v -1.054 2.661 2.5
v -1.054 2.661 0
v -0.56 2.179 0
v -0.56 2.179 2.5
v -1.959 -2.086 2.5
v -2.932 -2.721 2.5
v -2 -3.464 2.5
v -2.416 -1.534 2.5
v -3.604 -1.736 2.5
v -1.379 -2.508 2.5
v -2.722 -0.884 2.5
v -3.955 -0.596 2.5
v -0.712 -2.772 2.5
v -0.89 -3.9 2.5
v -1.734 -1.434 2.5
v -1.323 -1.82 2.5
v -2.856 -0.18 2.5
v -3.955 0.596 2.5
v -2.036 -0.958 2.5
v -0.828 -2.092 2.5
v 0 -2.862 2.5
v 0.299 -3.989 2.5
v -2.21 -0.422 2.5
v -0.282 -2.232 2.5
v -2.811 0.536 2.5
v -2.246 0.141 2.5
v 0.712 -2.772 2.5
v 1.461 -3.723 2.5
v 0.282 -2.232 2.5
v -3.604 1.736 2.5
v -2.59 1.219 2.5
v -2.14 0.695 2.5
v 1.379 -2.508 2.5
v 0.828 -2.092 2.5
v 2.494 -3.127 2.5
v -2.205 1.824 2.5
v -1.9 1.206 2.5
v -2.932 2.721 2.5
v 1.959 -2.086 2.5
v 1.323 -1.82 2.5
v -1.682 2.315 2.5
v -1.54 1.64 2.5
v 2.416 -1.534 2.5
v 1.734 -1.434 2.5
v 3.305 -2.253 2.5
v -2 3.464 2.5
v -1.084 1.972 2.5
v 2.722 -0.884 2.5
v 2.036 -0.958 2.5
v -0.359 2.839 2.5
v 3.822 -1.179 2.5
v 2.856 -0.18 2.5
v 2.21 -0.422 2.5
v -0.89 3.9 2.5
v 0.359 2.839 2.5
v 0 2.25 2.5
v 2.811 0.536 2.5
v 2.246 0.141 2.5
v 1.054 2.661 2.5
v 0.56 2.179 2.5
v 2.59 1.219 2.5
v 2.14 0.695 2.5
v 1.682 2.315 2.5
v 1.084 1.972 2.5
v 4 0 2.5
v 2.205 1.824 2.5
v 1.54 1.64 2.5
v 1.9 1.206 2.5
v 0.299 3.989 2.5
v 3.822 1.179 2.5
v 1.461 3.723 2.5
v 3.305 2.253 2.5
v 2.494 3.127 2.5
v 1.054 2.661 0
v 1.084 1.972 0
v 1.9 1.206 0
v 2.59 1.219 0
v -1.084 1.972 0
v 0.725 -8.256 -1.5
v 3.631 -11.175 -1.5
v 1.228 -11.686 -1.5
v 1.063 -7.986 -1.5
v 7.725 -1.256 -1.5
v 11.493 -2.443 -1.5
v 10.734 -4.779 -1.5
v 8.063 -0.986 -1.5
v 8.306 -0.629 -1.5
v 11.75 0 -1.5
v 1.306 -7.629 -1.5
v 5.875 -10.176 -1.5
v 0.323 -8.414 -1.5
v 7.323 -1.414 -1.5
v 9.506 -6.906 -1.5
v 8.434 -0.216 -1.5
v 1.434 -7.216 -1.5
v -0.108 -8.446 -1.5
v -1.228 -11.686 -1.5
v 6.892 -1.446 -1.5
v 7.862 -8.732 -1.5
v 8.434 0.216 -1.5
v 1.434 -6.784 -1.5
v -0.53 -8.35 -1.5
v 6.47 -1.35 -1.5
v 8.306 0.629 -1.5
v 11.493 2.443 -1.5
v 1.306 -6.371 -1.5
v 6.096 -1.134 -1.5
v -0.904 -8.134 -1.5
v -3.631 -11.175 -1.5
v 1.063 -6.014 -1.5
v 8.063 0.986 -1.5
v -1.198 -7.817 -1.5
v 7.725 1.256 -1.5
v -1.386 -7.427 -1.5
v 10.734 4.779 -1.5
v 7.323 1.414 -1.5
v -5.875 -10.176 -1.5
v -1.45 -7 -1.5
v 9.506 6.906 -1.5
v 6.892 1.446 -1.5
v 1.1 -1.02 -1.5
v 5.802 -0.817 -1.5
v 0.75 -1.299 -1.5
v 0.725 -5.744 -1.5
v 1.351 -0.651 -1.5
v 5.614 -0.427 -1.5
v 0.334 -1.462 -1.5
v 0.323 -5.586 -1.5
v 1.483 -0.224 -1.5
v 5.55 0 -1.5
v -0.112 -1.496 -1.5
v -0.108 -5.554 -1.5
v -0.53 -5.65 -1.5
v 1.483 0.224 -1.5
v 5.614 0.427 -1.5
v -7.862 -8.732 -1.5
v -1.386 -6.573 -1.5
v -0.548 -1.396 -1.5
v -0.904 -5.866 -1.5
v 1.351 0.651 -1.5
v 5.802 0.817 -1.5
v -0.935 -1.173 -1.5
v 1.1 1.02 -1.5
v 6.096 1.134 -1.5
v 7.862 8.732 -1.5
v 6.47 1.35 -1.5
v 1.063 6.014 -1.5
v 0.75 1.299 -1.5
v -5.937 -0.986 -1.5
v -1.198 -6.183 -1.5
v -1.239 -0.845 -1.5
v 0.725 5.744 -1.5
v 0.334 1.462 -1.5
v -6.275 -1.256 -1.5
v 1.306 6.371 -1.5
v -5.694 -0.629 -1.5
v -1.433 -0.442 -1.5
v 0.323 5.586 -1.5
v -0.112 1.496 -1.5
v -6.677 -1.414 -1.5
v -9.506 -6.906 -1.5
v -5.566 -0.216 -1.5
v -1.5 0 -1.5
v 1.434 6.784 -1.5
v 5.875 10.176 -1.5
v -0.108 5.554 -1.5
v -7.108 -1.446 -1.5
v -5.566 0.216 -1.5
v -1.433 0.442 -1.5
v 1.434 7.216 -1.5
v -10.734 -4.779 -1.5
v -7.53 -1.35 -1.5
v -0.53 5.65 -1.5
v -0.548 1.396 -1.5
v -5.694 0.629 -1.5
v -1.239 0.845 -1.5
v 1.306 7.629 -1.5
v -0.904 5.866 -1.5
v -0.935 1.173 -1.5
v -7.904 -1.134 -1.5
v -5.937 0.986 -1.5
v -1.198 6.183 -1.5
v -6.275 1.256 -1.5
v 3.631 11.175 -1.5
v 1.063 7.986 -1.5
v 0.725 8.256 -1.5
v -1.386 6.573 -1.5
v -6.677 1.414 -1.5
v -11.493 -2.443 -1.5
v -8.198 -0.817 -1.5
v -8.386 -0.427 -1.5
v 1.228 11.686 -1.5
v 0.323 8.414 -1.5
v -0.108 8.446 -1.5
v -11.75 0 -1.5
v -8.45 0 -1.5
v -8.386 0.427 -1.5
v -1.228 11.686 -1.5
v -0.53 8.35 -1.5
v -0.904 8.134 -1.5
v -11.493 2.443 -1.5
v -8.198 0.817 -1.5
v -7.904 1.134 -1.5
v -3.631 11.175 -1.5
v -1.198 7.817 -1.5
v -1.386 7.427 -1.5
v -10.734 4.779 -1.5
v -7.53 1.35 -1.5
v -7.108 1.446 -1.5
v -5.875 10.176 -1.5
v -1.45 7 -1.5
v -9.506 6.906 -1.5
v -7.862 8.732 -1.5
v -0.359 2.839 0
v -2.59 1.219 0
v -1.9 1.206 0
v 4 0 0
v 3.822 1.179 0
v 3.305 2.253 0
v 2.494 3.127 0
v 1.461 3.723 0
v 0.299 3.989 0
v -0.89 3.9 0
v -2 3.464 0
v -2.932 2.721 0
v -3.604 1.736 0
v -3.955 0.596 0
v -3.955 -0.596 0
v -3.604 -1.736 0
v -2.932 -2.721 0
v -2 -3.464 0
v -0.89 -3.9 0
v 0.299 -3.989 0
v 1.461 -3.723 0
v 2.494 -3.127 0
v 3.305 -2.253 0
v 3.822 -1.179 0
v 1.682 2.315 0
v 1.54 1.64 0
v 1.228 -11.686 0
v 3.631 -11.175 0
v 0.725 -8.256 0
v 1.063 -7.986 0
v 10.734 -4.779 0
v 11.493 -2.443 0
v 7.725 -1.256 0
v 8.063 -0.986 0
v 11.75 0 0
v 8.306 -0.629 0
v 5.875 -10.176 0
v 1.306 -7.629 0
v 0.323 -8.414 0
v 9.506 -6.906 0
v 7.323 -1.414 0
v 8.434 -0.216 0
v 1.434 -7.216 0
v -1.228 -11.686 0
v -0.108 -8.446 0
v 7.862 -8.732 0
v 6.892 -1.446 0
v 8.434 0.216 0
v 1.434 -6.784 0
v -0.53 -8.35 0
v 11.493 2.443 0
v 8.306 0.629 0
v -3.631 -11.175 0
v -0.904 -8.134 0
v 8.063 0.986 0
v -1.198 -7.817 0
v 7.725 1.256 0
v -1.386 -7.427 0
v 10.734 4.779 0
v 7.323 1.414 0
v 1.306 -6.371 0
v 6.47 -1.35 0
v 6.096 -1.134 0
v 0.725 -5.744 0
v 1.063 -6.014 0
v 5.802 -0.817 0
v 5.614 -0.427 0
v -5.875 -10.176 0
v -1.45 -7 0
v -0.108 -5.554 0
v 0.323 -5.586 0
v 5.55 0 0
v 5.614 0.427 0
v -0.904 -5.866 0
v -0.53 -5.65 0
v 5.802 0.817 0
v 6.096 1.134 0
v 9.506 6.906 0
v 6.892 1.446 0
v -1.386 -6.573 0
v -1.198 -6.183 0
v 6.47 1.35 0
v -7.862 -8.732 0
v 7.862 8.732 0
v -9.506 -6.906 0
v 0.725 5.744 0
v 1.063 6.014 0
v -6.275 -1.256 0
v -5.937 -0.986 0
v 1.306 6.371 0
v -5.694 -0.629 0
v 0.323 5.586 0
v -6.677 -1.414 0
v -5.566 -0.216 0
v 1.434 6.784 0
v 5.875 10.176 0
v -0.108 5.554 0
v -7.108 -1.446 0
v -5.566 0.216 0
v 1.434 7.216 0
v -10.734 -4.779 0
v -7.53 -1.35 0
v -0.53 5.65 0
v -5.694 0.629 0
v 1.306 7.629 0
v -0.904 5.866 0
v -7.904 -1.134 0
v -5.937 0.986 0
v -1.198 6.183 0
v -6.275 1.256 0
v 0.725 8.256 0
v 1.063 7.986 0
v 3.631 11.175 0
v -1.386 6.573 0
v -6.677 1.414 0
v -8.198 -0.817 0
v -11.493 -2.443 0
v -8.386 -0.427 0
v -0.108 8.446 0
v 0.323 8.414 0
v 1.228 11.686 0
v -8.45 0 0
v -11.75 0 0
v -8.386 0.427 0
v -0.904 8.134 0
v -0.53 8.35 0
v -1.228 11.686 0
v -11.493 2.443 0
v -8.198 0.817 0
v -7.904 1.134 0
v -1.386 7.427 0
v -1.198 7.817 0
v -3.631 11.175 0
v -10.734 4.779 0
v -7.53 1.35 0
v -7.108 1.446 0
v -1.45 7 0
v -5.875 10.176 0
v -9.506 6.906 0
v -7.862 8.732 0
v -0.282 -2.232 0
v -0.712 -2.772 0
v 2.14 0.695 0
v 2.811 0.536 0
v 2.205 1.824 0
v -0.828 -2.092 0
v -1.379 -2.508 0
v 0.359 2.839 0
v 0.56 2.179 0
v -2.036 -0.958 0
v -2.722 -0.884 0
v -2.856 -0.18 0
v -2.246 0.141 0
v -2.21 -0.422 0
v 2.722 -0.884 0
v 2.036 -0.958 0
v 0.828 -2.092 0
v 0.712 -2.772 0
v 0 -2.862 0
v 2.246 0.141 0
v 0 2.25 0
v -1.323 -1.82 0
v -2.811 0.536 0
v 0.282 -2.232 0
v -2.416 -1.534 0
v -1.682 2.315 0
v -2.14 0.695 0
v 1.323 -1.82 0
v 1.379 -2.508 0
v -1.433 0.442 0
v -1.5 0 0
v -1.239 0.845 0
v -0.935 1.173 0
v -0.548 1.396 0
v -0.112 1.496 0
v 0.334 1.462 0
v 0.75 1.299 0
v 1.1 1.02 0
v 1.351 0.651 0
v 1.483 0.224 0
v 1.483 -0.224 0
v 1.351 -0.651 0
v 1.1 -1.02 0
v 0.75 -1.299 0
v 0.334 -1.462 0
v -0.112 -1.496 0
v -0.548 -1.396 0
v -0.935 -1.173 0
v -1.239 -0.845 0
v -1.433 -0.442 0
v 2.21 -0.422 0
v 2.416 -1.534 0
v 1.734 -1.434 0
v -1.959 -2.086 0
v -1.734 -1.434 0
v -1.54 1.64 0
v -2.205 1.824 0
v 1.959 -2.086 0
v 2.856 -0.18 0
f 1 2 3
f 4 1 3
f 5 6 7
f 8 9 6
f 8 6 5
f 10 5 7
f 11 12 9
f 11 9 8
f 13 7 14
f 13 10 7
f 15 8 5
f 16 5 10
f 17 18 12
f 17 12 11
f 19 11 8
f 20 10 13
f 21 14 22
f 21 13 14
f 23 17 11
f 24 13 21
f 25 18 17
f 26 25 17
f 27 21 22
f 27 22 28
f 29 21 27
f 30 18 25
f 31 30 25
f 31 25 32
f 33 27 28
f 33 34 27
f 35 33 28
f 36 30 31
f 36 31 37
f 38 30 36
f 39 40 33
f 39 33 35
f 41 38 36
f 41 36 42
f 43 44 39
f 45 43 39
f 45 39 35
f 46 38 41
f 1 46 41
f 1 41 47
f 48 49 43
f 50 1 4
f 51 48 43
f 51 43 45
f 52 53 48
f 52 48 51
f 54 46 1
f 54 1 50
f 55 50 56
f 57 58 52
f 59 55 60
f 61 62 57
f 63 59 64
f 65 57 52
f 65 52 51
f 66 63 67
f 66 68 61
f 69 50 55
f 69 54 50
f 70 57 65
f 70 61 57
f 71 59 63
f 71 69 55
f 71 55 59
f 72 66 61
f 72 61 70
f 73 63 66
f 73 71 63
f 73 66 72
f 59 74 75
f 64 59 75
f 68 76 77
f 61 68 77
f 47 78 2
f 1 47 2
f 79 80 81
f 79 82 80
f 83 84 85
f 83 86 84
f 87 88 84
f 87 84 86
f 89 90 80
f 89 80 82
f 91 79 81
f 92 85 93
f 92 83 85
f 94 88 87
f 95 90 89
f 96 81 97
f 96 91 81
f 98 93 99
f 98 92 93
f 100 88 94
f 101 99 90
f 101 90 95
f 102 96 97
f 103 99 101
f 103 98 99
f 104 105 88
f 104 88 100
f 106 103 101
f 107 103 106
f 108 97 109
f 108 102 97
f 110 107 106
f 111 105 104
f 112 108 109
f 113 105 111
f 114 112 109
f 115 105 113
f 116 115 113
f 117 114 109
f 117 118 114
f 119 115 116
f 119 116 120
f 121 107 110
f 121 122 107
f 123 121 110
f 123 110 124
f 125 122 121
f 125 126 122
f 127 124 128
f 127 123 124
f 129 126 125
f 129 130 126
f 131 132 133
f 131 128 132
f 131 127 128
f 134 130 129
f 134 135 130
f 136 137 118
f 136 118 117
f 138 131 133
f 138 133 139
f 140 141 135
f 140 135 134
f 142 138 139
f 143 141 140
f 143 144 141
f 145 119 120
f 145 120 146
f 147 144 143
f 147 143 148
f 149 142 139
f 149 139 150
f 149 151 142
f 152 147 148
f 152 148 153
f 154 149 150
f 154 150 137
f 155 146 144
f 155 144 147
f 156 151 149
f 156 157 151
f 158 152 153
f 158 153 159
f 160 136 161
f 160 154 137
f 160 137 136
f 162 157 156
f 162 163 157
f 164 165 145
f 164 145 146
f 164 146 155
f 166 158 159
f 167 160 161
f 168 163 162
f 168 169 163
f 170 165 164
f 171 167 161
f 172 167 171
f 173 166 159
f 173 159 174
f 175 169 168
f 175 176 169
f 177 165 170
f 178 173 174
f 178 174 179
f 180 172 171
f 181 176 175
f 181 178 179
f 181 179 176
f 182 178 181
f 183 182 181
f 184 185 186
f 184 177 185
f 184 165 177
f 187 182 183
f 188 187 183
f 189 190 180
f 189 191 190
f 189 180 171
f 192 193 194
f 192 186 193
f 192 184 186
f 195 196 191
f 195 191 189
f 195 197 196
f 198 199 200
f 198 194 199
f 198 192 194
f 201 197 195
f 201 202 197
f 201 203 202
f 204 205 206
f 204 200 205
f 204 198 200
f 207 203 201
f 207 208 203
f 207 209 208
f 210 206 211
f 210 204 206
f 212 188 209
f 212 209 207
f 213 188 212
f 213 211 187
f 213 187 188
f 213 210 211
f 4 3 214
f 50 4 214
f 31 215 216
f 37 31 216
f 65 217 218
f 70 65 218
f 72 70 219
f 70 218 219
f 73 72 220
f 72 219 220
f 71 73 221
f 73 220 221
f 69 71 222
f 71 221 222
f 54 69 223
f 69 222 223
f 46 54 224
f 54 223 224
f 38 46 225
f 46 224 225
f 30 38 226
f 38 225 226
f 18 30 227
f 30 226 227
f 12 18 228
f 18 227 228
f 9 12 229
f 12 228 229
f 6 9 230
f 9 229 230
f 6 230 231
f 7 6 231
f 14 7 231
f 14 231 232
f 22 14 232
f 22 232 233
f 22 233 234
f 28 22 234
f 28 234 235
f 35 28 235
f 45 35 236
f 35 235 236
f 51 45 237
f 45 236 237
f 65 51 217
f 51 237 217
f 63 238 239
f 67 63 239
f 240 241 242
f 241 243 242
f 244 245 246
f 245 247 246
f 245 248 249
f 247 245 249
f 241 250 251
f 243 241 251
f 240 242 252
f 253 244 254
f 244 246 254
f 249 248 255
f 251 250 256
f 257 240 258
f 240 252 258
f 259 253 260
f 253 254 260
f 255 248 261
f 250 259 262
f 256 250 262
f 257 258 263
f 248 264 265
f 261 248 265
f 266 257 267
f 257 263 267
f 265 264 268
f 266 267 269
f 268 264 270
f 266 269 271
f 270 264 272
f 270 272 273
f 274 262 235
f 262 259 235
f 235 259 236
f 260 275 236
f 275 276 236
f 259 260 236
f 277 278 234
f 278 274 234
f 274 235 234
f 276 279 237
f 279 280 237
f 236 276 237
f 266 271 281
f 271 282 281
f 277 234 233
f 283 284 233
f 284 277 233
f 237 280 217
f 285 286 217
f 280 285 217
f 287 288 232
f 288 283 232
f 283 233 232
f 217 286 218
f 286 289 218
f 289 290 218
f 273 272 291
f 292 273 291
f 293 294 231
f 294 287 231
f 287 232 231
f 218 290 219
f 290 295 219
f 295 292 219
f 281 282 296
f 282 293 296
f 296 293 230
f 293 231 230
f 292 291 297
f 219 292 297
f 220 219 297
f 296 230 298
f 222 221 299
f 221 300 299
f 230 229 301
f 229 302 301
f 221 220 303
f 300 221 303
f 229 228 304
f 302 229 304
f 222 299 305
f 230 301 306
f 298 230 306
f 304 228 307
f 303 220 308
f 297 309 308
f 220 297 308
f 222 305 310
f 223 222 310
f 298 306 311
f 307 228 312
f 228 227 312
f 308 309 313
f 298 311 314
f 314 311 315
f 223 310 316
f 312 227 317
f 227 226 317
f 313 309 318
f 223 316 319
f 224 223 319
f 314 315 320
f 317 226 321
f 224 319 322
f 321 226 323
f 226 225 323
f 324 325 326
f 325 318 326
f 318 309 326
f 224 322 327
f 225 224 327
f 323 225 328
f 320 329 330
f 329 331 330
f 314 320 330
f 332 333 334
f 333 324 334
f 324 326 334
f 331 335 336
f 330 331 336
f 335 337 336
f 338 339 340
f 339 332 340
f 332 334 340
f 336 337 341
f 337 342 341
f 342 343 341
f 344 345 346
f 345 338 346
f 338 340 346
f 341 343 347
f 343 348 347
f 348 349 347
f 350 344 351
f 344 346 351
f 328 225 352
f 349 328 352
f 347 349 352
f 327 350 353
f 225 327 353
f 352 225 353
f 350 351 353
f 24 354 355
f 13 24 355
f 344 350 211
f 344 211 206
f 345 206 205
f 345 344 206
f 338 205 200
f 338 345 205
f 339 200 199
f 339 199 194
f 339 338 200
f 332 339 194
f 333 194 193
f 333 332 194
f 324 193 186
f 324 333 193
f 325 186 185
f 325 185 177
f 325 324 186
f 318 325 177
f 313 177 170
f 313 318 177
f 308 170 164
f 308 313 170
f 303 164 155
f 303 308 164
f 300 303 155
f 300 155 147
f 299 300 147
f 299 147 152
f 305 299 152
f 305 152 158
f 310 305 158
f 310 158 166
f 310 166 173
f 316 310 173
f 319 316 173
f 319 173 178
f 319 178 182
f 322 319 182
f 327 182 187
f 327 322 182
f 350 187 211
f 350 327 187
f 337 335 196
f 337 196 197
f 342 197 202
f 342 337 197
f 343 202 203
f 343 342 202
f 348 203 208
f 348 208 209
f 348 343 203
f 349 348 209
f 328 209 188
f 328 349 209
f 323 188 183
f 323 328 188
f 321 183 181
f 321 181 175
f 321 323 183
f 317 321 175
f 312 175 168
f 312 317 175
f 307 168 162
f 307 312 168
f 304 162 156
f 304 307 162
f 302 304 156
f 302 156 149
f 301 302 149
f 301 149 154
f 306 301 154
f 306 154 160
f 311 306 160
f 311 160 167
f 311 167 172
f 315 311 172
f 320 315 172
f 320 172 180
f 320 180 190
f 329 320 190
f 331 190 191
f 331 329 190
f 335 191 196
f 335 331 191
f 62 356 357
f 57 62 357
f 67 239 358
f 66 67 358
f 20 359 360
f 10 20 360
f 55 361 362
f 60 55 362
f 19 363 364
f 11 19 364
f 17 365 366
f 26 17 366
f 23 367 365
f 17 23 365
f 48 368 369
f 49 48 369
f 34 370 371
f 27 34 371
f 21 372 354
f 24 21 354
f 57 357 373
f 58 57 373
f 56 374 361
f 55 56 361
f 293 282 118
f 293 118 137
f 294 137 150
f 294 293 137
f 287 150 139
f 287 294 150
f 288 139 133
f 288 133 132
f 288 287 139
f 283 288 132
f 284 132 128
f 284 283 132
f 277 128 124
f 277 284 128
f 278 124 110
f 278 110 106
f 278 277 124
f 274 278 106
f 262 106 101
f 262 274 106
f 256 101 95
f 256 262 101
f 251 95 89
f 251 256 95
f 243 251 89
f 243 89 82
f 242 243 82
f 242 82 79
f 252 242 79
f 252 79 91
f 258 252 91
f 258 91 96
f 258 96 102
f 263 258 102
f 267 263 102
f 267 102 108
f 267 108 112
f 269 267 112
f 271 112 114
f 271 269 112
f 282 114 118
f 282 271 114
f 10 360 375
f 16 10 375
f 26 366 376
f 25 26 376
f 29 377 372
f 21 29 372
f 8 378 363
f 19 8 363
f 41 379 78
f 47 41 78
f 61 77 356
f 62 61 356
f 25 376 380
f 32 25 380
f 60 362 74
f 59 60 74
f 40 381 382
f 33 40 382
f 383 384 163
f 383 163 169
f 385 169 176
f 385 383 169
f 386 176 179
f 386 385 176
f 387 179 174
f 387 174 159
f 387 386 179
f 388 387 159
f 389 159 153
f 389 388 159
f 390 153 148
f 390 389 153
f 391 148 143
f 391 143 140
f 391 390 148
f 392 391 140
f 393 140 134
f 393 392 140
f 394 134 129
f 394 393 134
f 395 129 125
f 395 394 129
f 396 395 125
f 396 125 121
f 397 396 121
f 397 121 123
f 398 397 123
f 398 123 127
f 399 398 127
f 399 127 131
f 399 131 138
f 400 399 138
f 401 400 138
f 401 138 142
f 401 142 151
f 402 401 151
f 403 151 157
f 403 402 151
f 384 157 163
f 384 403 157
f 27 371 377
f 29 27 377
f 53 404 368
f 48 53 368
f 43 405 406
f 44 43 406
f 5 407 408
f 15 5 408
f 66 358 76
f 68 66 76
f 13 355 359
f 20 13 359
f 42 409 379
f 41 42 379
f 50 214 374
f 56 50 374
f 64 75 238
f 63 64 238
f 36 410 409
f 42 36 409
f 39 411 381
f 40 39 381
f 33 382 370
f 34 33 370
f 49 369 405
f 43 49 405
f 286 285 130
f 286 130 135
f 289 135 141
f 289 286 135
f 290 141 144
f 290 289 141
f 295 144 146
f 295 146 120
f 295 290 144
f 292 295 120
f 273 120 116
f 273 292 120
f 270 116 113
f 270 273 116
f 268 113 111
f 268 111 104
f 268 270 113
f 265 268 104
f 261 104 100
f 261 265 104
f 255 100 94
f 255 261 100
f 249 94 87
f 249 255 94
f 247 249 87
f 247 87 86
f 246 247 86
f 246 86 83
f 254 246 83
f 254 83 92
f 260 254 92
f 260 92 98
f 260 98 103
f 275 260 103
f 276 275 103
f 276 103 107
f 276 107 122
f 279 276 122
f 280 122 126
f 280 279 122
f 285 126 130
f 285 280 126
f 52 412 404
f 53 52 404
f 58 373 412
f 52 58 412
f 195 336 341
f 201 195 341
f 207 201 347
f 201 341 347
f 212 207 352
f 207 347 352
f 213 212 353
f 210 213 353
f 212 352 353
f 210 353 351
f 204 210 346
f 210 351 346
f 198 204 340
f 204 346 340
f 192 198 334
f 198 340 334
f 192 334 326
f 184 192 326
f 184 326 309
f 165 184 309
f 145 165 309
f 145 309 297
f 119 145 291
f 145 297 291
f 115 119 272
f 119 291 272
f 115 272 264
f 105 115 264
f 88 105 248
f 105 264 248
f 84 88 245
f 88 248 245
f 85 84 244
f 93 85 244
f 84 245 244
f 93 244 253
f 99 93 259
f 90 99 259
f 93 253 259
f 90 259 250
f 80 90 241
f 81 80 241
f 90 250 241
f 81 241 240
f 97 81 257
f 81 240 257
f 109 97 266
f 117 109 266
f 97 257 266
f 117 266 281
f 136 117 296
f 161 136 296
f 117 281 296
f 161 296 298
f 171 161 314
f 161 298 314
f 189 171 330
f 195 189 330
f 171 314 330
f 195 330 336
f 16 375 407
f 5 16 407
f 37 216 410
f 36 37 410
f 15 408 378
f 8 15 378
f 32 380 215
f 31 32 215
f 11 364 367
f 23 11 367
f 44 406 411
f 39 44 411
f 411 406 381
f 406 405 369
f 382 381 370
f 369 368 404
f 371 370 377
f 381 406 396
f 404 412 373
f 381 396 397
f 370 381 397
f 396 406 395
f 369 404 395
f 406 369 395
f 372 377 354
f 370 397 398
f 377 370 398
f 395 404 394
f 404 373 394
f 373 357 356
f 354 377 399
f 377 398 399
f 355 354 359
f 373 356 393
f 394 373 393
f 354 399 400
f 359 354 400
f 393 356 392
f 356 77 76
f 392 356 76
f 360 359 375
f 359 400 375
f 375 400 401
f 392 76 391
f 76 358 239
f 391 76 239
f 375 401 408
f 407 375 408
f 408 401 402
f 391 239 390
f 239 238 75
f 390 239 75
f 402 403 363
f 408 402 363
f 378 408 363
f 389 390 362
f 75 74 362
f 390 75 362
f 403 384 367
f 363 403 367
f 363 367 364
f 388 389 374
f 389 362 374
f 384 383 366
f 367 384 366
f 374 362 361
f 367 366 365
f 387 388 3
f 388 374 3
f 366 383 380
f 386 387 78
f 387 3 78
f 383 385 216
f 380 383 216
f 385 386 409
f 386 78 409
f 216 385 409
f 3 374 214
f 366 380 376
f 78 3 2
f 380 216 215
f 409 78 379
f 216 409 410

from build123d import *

# Parameters (mm, degrees)
SKETCH_1_R      = 4
EXTRUDE_1_DEPTH = 2.5
SKETCH_2_R      = 11.75
SKETCH_2_R_2    = 1.45
SKETCH_2_R_3    = 1.5
EXTRUDE_2_DEPTH = 1.5


with BuildPart() as part:
    # 草图1 → 凸台-拉伸1 (new body)
    with BuildSketch(Plane.XY):
        Circle(SKETCH_1_R)
        Polygon((0, 2.25), (0.358703838, 2.839433251), (0.559552246, 2.179312113), (1.053572832, 2.661021217), (1.083945767, 1.97169003), (1.68224197, 2.315407433), (1.540230988, 1.640179412), (2.205209658, 1.824308085), (1.899737832, 1.205610289), (2.589615914, 1.218580751), (2.139877162, 0.695288237), (2.811307077, 0.536285507), (2.245560139, 0.141278669), (2.856353478, -0.179706529), (2.210146314, -0.421607958), (2.721924685, -0.884406942), (2.035860868, -0.958003406), (2.416467353, -1.533536814), (1.733654796, -1.434203977), (1.95917449, -2.086308928), (1.322516818, -1.820288237), (1.378779489, -2.50799058), (0.828280244, -2.091997093), (0.711750702, -2.772085959), (0.281999776, -2.232258078), (0, -2.862000983), (-0.281999776, -2.232258078), (-0.711750702, -2.772085959), (-0.828280244, -2.091997093), (-1.378779489, -2.50799058), (-1.322516818, -1.820288237), (-1.95917449, -2.086308928), (-1.733654796, -1.434203977), (-2.416467353, -1.533536814), (-2.035860868, -0.958003406), (-2.721924685, -0.884406942), (-2.210146314, -0.421607958), (-2.856353478, -0.179706529), (-2.245560139, 0.141278669), (-2.811307077, 0.536285507), (-2.139877162, 0.695288237), (-2.589615914, 1.218580751), (-1.899737832, 1.205610289), (-2.205209658, 1.824308085), (-1.540230988, 1.640179412), (-1.68224197, 2.315407433), (-1.083945767, 1.97169003), (-1.053572832, 2.661021217), (-0.559552246, 2.179312113), (-0.358703838, 2.839433251), align=None, mode=Mode.SUBTRACT)
    extrude(amount=EXTRUDE_1_DEPTH)

    # 草图2 → 凸台-拉伸2 (add)
    with BuildSketch(Plane(origin=(0, 0, 0), x_dir=(-1, 0, 0), z_dir=(0, 0, -1))):
        Circle(SKETCH_2_R)
        with Locations((-7, 0)):
            Circle(SKETCH_2_R_2, mode=Mode.SUBTRACT)
        with Locations((0, 7)):
            Circle(SKETCH_2_R_2, mode=Mode.SUBTRACT)
        with Locations((7, 0)):
            Circle(SKETCH_2_R_2, mode=Mode.SUBTRACT)
        with Locations((0, -7)):
            Circle(SKETCH_2_R_2, mode=Mode.SUBTRACT)
        Circle(SKETCH_2_R_3, mode=Mode.SUBTRACT)
    extrude(amount=EXTRUDE_2_DEPTH)


solid = part.part
